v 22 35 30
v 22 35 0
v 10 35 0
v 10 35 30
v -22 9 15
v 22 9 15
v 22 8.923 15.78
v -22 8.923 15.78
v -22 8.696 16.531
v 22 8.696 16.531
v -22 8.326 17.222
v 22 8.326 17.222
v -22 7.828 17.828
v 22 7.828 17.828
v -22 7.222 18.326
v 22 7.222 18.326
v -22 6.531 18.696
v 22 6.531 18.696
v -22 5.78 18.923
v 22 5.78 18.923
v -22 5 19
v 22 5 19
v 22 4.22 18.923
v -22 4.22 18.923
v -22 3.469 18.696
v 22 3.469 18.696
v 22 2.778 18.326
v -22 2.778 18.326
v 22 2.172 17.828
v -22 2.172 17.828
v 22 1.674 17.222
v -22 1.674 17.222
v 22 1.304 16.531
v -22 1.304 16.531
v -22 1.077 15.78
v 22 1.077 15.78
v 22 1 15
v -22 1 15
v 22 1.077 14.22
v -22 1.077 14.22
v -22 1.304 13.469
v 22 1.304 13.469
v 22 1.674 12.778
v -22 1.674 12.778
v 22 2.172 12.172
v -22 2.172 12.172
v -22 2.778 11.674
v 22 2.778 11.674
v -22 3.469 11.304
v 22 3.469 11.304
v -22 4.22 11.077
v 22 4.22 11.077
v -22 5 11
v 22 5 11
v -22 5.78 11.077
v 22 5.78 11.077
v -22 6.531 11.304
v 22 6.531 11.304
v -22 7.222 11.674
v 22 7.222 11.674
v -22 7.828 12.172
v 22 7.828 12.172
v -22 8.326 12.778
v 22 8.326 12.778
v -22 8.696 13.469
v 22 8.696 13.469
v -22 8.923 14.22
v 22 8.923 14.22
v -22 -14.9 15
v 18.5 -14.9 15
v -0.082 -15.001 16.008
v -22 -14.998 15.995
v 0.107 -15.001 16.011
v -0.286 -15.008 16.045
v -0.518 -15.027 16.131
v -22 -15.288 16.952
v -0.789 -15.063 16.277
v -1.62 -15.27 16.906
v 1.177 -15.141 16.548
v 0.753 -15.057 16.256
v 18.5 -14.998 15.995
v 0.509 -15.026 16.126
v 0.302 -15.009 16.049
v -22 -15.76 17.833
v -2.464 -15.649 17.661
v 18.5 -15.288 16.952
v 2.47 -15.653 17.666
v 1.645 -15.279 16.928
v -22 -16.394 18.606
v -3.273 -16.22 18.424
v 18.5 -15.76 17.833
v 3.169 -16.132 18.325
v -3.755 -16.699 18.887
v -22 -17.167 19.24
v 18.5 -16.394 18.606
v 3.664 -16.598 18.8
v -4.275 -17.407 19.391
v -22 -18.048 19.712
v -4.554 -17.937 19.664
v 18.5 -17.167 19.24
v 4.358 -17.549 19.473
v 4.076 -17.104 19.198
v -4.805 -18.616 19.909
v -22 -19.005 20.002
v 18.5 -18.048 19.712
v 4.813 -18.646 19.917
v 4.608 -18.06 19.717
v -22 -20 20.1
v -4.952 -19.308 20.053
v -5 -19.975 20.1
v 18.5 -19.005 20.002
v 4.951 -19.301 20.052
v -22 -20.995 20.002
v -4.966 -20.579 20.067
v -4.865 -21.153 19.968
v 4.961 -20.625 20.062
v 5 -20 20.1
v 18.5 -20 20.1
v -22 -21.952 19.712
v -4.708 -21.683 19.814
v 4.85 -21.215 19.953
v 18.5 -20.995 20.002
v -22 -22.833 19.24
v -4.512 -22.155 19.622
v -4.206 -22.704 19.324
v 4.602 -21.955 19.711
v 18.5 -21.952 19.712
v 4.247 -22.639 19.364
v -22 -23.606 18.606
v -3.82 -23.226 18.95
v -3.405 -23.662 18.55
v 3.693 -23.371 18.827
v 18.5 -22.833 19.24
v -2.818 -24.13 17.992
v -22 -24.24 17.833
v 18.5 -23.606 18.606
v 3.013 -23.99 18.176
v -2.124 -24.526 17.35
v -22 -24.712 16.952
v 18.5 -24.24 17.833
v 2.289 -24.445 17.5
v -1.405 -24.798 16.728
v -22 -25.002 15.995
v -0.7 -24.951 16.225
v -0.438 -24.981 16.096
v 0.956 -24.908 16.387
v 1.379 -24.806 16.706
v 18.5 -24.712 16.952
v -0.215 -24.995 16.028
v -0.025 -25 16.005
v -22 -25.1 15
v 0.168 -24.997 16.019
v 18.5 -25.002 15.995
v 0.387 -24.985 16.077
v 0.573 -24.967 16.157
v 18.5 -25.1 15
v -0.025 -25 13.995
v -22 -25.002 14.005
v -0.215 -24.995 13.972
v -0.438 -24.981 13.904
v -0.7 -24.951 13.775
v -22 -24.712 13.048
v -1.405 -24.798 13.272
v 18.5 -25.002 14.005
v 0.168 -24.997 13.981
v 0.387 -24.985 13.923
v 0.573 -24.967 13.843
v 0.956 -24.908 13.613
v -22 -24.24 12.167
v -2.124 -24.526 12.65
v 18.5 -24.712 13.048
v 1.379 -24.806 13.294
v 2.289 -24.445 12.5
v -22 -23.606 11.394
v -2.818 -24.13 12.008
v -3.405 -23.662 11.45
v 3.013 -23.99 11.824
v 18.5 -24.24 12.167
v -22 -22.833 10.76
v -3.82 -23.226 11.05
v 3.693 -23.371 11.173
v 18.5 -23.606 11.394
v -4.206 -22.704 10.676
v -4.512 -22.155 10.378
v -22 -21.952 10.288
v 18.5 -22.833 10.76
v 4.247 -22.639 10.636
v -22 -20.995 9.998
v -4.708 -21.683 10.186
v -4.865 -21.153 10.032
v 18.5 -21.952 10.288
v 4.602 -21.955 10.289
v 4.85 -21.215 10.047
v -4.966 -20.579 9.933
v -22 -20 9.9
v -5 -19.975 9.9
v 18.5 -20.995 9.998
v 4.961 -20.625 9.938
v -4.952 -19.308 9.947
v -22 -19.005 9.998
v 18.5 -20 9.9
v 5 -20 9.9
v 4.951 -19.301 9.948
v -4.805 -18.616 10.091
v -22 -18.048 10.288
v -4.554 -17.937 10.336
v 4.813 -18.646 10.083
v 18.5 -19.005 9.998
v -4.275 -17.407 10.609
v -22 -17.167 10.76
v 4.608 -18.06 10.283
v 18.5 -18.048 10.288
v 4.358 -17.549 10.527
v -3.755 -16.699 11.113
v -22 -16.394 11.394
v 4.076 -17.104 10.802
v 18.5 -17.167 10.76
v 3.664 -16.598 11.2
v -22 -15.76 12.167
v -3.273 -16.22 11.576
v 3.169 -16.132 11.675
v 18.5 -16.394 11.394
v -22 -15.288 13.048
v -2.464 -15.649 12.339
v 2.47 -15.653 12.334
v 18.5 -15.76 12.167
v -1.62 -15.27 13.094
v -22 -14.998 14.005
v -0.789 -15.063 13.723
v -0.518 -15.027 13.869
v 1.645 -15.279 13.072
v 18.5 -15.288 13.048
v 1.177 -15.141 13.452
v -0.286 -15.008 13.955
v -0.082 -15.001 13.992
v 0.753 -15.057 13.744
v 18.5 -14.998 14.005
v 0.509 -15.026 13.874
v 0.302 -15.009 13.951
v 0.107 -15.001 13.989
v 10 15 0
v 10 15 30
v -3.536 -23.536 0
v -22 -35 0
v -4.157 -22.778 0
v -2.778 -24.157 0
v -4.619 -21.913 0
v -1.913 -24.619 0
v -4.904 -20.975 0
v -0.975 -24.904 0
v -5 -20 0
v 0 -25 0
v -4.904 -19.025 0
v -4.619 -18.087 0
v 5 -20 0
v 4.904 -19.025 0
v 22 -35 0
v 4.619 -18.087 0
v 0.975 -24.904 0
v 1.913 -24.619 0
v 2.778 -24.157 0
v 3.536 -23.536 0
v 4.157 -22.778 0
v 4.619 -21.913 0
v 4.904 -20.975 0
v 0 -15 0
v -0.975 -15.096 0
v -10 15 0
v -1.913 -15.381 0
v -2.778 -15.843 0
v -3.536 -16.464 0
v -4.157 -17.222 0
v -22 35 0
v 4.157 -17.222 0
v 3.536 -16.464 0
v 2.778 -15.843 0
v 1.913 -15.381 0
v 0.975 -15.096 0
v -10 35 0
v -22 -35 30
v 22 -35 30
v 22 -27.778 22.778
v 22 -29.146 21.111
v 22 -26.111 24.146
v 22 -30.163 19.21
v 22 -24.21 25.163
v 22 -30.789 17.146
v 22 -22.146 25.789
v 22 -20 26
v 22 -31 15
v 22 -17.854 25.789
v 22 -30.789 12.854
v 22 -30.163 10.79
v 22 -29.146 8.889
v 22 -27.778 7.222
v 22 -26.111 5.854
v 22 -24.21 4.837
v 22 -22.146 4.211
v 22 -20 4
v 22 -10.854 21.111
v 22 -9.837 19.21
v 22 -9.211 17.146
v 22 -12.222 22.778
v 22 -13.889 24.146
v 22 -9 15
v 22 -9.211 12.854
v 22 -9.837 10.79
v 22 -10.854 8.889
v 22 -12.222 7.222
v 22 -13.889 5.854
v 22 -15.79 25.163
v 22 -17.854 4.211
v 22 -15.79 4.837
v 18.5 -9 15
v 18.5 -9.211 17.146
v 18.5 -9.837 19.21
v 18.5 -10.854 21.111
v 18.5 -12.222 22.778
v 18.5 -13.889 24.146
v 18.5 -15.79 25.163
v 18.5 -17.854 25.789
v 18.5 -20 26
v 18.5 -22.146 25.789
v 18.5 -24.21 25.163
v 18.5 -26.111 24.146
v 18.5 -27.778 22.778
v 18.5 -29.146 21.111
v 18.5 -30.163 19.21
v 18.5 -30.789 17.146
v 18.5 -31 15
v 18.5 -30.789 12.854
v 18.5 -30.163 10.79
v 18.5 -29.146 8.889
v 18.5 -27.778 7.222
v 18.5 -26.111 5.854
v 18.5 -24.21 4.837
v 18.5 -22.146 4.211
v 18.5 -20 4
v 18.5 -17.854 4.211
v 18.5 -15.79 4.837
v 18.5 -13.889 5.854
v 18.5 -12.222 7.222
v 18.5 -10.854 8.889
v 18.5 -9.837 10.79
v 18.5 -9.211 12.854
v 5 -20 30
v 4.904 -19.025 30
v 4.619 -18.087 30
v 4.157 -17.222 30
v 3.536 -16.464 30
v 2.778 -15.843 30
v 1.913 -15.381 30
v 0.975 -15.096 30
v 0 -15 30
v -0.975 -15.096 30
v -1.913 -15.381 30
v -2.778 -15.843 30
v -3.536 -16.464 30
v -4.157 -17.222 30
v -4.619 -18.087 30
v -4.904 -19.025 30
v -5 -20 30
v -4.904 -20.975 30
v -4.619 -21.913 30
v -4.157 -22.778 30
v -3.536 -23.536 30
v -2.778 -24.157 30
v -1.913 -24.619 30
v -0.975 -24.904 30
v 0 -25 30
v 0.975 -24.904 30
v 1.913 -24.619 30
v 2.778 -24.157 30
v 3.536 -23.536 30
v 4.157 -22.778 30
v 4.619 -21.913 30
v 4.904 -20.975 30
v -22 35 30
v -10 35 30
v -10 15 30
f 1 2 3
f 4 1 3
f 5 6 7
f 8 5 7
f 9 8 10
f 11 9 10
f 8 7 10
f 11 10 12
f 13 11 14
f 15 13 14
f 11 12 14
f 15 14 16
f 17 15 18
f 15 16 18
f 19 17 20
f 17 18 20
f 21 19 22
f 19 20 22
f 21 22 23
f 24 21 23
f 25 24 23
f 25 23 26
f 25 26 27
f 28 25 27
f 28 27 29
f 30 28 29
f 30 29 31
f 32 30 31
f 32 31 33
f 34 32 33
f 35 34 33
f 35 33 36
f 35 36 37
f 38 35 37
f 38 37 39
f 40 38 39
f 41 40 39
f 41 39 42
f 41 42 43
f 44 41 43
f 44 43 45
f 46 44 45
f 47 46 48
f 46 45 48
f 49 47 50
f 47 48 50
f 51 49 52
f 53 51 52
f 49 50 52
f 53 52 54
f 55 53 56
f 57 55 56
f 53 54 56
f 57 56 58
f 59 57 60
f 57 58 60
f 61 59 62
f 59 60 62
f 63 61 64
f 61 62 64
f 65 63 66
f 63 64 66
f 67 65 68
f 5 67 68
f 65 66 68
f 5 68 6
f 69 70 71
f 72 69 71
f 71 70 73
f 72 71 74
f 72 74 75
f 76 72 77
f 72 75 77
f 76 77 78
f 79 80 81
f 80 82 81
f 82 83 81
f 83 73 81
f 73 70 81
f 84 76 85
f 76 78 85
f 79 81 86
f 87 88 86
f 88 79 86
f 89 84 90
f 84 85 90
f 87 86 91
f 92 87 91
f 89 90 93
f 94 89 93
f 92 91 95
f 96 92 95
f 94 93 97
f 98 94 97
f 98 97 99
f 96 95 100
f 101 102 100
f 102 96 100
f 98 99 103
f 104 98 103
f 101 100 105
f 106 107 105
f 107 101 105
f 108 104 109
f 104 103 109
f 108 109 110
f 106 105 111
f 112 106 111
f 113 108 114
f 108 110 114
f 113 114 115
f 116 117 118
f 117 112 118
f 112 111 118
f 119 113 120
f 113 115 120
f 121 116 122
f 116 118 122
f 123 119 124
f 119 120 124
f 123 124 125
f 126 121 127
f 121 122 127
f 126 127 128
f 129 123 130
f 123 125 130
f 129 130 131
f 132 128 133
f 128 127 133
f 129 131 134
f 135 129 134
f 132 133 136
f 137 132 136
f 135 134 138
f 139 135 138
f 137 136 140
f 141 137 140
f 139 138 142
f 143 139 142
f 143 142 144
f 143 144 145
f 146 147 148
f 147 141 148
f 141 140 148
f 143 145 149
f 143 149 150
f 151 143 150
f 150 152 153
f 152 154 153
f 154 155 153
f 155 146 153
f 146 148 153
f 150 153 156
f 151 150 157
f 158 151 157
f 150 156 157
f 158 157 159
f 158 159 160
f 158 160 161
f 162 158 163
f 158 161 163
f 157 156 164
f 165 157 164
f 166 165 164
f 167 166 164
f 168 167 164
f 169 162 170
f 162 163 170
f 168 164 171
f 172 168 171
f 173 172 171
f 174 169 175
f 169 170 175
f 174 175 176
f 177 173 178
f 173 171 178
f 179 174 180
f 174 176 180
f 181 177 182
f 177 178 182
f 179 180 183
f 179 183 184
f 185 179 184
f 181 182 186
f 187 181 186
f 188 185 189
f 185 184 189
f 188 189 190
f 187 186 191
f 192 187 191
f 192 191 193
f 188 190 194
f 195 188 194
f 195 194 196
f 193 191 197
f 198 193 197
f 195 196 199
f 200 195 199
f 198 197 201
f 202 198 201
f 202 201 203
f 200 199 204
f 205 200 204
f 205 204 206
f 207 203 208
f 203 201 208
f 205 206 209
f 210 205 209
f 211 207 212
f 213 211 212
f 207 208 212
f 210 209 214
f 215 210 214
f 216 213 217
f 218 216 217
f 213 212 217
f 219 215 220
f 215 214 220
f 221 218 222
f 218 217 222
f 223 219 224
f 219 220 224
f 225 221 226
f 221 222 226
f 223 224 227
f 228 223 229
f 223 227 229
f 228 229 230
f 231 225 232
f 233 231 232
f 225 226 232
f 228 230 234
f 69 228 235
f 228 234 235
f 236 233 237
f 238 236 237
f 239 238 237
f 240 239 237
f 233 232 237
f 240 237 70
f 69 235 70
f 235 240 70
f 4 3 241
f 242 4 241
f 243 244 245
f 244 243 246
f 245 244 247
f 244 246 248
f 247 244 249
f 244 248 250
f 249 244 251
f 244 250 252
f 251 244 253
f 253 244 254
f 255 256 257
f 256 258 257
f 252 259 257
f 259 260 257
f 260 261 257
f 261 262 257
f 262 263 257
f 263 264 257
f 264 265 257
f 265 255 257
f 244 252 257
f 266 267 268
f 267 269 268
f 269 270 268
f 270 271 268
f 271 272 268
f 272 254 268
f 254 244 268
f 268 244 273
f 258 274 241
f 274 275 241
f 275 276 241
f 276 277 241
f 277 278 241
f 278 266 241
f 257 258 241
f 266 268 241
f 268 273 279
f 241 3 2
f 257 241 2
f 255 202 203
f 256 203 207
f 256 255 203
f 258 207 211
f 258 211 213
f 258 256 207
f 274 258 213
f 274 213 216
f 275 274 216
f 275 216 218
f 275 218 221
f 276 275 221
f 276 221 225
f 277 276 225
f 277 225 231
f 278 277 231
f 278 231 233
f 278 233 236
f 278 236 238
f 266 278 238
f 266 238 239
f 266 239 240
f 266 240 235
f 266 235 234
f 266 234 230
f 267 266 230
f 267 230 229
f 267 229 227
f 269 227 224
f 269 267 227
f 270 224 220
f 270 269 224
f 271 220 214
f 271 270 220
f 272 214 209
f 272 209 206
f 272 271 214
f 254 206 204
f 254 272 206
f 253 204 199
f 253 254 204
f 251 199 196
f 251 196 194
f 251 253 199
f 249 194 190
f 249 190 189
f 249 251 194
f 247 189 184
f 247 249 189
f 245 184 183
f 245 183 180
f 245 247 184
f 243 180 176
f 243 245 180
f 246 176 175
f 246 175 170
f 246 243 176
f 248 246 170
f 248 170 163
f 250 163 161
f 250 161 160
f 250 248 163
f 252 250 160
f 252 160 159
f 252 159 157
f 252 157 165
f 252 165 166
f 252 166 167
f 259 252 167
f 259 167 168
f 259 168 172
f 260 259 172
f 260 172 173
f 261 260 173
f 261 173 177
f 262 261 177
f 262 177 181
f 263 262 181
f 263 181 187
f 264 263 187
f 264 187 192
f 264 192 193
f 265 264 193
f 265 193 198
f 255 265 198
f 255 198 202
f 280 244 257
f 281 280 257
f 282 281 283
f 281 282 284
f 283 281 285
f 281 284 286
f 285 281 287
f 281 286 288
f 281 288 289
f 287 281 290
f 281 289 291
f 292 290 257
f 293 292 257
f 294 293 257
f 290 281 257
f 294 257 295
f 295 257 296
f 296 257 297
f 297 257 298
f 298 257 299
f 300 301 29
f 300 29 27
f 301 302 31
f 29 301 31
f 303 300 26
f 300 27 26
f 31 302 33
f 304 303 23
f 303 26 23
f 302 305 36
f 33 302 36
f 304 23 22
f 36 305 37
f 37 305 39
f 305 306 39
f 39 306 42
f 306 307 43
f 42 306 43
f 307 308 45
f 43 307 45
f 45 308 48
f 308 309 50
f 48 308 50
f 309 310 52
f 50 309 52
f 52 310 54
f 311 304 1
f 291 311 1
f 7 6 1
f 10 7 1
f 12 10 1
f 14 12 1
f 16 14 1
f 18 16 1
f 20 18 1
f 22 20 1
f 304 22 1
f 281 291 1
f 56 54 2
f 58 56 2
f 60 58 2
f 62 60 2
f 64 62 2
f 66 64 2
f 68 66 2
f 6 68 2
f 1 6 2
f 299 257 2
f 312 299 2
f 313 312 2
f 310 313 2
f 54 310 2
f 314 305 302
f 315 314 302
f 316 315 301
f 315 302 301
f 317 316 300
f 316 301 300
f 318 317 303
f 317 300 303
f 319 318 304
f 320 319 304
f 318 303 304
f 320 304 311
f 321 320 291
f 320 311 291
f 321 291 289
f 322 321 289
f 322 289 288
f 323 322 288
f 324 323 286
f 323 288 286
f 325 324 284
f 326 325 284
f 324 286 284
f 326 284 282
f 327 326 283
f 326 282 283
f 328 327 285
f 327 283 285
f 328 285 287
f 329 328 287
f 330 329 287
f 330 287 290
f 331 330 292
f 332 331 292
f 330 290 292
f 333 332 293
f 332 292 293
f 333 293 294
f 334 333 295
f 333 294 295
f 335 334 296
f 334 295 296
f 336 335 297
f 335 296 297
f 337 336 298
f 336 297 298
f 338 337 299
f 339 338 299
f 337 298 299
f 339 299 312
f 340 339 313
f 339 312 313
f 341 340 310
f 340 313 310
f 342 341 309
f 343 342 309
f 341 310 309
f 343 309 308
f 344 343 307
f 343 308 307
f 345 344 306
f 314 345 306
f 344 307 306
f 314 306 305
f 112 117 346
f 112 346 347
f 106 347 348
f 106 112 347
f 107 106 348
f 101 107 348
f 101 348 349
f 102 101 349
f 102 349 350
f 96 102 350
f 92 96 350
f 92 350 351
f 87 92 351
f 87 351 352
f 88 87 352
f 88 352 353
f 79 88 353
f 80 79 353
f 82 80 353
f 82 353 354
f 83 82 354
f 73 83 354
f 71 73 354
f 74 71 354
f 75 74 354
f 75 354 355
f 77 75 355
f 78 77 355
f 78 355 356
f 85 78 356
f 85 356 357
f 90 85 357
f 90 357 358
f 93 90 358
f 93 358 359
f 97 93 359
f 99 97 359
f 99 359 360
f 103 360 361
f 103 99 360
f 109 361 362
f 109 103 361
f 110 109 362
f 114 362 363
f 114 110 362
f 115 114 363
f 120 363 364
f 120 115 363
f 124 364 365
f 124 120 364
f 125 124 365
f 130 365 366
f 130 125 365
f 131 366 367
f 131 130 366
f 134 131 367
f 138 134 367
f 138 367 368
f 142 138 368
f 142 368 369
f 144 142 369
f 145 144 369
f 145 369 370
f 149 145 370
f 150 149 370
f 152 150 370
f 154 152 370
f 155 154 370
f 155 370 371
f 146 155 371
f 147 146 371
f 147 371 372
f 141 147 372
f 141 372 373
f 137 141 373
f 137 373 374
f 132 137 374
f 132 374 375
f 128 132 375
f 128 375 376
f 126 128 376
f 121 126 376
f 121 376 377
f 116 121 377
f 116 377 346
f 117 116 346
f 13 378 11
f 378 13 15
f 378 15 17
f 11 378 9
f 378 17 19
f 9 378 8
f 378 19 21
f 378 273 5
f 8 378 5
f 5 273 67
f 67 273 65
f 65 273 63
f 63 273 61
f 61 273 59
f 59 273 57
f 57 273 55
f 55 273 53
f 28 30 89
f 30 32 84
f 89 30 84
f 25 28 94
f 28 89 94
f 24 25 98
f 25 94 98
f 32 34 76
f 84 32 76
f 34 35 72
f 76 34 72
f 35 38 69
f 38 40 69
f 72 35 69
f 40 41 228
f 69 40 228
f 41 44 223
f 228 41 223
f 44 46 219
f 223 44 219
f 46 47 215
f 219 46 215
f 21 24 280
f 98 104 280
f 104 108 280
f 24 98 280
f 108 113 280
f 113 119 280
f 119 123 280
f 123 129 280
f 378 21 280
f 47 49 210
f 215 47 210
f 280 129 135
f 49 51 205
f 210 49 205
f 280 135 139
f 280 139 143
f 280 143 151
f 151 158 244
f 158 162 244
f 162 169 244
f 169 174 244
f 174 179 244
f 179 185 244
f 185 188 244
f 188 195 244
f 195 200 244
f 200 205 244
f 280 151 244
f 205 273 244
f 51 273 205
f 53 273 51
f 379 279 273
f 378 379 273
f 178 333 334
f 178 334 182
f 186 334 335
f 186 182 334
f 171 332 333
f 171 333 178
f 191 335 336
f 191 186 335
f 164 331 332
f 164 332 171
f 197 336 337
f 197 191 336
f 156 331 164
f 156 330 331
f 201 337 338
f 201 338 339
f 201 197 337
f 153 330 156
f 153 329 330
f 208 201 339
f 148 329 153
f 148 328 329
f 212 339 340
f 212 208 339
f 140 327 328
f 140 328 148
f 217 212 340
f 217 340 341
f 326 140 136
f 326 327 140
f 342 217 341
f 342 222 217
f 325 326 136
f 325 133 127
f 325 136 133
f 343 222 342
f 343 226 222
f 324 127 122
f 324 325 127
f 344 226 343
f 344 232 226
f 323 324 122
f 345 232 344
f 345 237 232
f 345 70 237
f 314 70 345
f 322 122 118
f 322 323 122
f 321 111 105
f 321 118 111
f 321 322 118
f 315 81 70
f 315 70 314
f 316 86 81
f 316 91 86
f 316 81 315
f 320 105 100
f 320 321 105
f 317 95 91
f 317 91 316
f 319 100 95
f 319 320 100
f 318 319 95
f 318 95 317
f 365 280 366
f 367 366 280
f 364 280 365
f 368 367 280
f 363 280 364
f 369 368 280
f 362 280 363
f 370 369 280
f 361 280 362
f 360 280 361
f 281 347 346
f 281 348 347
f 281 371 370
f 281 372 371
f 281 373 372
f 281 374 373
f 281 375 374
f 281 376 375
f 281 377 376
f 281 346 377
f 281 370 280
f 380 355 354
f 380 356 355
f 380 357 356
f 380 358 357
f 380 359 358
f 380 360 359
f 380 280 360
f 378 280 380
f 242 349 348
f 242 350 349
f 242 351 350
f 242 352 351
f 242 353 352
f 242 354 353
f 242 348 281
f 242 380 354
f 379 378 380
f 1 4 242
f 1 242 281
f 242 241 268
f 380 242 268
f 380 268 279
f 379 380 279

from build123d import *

# Parameters (mm, degrees)
CROQUIS1_R              = 5
SALIENTE_EXTRUIR1_DEPTH = 30
CROQUIS2_R              = 11
CORTAR_EXTRUIR1_DEPTH   = 3.5
CROQUIS3_R              = 5.1
CORTAR_EXTRUIR2_DEPTH   = 62.361632964
CROQUIS4_R              = 4
CORTAR_EXTRUIR3_DEPTH   = 64.725975982


with BuildPart() as part:
    # Croquis1 → Saliente-Extruir1 (new body)
    with BuildSketch(Plane.XY):
        Polygon((-10, 35), (-22, 35), (-22, -35), (22, -35), (22, 35), (10, 35), (10, 15), (-10, 15), align=None)
        with Locations((0, -20)):
            Circle(CROQUIS1_R, mode=Mode.SUBTRACT)
    extrude(amount=SALIENTE_EXTRUIR1_DEPTH)

    # Croquis2 → Cortar-Extruir1 (cut)
    with BuildSketch(Plane(origin=(22, 0, 0), x_dir=(0, 0, -1), z_dir=(1, 0, 0))):
        with Locations(Location((-15, -20, 0), (0, 0, 90))):
            Circle(CROQUIS2_R)
    extrude(amount=-CORTAR_EXTRUIR1_DEPTH, mode=Mode.SUBTRACT)

    # Croquis3 → Cortar-Extruir2 (cut, through all)
    with BuildSketch(Plane(origin=(18.5, 0, 0), x_dir=(0, 0, -1), z_dir=(1, 0, 0))):
        with Locations(Location((-15, -20, 0), (0, 0, 90))):
            Circle(CROQUIS3_R)
    extrude(amount=-CORTAR_EXTRUIR2_DEPTH, mode=Mode.SUBTRACT)

    # Croquis4 → Cortar-Extruir3 (cut, through all)
    with BuildSketch(Plane(origin=(22, 0, 0), x_dir=(0, 0, -1), z_dir=(1, 0, 0))):
        with Locations(Location((-15, 5, 0), (0, 0, 90))):
            Circle(CROQUIS4_R)
    extrude(amount=-CORTAR_EXTRUIR3_DEPTH, mode=Mode.SUBTRACT)


solid = part.part
